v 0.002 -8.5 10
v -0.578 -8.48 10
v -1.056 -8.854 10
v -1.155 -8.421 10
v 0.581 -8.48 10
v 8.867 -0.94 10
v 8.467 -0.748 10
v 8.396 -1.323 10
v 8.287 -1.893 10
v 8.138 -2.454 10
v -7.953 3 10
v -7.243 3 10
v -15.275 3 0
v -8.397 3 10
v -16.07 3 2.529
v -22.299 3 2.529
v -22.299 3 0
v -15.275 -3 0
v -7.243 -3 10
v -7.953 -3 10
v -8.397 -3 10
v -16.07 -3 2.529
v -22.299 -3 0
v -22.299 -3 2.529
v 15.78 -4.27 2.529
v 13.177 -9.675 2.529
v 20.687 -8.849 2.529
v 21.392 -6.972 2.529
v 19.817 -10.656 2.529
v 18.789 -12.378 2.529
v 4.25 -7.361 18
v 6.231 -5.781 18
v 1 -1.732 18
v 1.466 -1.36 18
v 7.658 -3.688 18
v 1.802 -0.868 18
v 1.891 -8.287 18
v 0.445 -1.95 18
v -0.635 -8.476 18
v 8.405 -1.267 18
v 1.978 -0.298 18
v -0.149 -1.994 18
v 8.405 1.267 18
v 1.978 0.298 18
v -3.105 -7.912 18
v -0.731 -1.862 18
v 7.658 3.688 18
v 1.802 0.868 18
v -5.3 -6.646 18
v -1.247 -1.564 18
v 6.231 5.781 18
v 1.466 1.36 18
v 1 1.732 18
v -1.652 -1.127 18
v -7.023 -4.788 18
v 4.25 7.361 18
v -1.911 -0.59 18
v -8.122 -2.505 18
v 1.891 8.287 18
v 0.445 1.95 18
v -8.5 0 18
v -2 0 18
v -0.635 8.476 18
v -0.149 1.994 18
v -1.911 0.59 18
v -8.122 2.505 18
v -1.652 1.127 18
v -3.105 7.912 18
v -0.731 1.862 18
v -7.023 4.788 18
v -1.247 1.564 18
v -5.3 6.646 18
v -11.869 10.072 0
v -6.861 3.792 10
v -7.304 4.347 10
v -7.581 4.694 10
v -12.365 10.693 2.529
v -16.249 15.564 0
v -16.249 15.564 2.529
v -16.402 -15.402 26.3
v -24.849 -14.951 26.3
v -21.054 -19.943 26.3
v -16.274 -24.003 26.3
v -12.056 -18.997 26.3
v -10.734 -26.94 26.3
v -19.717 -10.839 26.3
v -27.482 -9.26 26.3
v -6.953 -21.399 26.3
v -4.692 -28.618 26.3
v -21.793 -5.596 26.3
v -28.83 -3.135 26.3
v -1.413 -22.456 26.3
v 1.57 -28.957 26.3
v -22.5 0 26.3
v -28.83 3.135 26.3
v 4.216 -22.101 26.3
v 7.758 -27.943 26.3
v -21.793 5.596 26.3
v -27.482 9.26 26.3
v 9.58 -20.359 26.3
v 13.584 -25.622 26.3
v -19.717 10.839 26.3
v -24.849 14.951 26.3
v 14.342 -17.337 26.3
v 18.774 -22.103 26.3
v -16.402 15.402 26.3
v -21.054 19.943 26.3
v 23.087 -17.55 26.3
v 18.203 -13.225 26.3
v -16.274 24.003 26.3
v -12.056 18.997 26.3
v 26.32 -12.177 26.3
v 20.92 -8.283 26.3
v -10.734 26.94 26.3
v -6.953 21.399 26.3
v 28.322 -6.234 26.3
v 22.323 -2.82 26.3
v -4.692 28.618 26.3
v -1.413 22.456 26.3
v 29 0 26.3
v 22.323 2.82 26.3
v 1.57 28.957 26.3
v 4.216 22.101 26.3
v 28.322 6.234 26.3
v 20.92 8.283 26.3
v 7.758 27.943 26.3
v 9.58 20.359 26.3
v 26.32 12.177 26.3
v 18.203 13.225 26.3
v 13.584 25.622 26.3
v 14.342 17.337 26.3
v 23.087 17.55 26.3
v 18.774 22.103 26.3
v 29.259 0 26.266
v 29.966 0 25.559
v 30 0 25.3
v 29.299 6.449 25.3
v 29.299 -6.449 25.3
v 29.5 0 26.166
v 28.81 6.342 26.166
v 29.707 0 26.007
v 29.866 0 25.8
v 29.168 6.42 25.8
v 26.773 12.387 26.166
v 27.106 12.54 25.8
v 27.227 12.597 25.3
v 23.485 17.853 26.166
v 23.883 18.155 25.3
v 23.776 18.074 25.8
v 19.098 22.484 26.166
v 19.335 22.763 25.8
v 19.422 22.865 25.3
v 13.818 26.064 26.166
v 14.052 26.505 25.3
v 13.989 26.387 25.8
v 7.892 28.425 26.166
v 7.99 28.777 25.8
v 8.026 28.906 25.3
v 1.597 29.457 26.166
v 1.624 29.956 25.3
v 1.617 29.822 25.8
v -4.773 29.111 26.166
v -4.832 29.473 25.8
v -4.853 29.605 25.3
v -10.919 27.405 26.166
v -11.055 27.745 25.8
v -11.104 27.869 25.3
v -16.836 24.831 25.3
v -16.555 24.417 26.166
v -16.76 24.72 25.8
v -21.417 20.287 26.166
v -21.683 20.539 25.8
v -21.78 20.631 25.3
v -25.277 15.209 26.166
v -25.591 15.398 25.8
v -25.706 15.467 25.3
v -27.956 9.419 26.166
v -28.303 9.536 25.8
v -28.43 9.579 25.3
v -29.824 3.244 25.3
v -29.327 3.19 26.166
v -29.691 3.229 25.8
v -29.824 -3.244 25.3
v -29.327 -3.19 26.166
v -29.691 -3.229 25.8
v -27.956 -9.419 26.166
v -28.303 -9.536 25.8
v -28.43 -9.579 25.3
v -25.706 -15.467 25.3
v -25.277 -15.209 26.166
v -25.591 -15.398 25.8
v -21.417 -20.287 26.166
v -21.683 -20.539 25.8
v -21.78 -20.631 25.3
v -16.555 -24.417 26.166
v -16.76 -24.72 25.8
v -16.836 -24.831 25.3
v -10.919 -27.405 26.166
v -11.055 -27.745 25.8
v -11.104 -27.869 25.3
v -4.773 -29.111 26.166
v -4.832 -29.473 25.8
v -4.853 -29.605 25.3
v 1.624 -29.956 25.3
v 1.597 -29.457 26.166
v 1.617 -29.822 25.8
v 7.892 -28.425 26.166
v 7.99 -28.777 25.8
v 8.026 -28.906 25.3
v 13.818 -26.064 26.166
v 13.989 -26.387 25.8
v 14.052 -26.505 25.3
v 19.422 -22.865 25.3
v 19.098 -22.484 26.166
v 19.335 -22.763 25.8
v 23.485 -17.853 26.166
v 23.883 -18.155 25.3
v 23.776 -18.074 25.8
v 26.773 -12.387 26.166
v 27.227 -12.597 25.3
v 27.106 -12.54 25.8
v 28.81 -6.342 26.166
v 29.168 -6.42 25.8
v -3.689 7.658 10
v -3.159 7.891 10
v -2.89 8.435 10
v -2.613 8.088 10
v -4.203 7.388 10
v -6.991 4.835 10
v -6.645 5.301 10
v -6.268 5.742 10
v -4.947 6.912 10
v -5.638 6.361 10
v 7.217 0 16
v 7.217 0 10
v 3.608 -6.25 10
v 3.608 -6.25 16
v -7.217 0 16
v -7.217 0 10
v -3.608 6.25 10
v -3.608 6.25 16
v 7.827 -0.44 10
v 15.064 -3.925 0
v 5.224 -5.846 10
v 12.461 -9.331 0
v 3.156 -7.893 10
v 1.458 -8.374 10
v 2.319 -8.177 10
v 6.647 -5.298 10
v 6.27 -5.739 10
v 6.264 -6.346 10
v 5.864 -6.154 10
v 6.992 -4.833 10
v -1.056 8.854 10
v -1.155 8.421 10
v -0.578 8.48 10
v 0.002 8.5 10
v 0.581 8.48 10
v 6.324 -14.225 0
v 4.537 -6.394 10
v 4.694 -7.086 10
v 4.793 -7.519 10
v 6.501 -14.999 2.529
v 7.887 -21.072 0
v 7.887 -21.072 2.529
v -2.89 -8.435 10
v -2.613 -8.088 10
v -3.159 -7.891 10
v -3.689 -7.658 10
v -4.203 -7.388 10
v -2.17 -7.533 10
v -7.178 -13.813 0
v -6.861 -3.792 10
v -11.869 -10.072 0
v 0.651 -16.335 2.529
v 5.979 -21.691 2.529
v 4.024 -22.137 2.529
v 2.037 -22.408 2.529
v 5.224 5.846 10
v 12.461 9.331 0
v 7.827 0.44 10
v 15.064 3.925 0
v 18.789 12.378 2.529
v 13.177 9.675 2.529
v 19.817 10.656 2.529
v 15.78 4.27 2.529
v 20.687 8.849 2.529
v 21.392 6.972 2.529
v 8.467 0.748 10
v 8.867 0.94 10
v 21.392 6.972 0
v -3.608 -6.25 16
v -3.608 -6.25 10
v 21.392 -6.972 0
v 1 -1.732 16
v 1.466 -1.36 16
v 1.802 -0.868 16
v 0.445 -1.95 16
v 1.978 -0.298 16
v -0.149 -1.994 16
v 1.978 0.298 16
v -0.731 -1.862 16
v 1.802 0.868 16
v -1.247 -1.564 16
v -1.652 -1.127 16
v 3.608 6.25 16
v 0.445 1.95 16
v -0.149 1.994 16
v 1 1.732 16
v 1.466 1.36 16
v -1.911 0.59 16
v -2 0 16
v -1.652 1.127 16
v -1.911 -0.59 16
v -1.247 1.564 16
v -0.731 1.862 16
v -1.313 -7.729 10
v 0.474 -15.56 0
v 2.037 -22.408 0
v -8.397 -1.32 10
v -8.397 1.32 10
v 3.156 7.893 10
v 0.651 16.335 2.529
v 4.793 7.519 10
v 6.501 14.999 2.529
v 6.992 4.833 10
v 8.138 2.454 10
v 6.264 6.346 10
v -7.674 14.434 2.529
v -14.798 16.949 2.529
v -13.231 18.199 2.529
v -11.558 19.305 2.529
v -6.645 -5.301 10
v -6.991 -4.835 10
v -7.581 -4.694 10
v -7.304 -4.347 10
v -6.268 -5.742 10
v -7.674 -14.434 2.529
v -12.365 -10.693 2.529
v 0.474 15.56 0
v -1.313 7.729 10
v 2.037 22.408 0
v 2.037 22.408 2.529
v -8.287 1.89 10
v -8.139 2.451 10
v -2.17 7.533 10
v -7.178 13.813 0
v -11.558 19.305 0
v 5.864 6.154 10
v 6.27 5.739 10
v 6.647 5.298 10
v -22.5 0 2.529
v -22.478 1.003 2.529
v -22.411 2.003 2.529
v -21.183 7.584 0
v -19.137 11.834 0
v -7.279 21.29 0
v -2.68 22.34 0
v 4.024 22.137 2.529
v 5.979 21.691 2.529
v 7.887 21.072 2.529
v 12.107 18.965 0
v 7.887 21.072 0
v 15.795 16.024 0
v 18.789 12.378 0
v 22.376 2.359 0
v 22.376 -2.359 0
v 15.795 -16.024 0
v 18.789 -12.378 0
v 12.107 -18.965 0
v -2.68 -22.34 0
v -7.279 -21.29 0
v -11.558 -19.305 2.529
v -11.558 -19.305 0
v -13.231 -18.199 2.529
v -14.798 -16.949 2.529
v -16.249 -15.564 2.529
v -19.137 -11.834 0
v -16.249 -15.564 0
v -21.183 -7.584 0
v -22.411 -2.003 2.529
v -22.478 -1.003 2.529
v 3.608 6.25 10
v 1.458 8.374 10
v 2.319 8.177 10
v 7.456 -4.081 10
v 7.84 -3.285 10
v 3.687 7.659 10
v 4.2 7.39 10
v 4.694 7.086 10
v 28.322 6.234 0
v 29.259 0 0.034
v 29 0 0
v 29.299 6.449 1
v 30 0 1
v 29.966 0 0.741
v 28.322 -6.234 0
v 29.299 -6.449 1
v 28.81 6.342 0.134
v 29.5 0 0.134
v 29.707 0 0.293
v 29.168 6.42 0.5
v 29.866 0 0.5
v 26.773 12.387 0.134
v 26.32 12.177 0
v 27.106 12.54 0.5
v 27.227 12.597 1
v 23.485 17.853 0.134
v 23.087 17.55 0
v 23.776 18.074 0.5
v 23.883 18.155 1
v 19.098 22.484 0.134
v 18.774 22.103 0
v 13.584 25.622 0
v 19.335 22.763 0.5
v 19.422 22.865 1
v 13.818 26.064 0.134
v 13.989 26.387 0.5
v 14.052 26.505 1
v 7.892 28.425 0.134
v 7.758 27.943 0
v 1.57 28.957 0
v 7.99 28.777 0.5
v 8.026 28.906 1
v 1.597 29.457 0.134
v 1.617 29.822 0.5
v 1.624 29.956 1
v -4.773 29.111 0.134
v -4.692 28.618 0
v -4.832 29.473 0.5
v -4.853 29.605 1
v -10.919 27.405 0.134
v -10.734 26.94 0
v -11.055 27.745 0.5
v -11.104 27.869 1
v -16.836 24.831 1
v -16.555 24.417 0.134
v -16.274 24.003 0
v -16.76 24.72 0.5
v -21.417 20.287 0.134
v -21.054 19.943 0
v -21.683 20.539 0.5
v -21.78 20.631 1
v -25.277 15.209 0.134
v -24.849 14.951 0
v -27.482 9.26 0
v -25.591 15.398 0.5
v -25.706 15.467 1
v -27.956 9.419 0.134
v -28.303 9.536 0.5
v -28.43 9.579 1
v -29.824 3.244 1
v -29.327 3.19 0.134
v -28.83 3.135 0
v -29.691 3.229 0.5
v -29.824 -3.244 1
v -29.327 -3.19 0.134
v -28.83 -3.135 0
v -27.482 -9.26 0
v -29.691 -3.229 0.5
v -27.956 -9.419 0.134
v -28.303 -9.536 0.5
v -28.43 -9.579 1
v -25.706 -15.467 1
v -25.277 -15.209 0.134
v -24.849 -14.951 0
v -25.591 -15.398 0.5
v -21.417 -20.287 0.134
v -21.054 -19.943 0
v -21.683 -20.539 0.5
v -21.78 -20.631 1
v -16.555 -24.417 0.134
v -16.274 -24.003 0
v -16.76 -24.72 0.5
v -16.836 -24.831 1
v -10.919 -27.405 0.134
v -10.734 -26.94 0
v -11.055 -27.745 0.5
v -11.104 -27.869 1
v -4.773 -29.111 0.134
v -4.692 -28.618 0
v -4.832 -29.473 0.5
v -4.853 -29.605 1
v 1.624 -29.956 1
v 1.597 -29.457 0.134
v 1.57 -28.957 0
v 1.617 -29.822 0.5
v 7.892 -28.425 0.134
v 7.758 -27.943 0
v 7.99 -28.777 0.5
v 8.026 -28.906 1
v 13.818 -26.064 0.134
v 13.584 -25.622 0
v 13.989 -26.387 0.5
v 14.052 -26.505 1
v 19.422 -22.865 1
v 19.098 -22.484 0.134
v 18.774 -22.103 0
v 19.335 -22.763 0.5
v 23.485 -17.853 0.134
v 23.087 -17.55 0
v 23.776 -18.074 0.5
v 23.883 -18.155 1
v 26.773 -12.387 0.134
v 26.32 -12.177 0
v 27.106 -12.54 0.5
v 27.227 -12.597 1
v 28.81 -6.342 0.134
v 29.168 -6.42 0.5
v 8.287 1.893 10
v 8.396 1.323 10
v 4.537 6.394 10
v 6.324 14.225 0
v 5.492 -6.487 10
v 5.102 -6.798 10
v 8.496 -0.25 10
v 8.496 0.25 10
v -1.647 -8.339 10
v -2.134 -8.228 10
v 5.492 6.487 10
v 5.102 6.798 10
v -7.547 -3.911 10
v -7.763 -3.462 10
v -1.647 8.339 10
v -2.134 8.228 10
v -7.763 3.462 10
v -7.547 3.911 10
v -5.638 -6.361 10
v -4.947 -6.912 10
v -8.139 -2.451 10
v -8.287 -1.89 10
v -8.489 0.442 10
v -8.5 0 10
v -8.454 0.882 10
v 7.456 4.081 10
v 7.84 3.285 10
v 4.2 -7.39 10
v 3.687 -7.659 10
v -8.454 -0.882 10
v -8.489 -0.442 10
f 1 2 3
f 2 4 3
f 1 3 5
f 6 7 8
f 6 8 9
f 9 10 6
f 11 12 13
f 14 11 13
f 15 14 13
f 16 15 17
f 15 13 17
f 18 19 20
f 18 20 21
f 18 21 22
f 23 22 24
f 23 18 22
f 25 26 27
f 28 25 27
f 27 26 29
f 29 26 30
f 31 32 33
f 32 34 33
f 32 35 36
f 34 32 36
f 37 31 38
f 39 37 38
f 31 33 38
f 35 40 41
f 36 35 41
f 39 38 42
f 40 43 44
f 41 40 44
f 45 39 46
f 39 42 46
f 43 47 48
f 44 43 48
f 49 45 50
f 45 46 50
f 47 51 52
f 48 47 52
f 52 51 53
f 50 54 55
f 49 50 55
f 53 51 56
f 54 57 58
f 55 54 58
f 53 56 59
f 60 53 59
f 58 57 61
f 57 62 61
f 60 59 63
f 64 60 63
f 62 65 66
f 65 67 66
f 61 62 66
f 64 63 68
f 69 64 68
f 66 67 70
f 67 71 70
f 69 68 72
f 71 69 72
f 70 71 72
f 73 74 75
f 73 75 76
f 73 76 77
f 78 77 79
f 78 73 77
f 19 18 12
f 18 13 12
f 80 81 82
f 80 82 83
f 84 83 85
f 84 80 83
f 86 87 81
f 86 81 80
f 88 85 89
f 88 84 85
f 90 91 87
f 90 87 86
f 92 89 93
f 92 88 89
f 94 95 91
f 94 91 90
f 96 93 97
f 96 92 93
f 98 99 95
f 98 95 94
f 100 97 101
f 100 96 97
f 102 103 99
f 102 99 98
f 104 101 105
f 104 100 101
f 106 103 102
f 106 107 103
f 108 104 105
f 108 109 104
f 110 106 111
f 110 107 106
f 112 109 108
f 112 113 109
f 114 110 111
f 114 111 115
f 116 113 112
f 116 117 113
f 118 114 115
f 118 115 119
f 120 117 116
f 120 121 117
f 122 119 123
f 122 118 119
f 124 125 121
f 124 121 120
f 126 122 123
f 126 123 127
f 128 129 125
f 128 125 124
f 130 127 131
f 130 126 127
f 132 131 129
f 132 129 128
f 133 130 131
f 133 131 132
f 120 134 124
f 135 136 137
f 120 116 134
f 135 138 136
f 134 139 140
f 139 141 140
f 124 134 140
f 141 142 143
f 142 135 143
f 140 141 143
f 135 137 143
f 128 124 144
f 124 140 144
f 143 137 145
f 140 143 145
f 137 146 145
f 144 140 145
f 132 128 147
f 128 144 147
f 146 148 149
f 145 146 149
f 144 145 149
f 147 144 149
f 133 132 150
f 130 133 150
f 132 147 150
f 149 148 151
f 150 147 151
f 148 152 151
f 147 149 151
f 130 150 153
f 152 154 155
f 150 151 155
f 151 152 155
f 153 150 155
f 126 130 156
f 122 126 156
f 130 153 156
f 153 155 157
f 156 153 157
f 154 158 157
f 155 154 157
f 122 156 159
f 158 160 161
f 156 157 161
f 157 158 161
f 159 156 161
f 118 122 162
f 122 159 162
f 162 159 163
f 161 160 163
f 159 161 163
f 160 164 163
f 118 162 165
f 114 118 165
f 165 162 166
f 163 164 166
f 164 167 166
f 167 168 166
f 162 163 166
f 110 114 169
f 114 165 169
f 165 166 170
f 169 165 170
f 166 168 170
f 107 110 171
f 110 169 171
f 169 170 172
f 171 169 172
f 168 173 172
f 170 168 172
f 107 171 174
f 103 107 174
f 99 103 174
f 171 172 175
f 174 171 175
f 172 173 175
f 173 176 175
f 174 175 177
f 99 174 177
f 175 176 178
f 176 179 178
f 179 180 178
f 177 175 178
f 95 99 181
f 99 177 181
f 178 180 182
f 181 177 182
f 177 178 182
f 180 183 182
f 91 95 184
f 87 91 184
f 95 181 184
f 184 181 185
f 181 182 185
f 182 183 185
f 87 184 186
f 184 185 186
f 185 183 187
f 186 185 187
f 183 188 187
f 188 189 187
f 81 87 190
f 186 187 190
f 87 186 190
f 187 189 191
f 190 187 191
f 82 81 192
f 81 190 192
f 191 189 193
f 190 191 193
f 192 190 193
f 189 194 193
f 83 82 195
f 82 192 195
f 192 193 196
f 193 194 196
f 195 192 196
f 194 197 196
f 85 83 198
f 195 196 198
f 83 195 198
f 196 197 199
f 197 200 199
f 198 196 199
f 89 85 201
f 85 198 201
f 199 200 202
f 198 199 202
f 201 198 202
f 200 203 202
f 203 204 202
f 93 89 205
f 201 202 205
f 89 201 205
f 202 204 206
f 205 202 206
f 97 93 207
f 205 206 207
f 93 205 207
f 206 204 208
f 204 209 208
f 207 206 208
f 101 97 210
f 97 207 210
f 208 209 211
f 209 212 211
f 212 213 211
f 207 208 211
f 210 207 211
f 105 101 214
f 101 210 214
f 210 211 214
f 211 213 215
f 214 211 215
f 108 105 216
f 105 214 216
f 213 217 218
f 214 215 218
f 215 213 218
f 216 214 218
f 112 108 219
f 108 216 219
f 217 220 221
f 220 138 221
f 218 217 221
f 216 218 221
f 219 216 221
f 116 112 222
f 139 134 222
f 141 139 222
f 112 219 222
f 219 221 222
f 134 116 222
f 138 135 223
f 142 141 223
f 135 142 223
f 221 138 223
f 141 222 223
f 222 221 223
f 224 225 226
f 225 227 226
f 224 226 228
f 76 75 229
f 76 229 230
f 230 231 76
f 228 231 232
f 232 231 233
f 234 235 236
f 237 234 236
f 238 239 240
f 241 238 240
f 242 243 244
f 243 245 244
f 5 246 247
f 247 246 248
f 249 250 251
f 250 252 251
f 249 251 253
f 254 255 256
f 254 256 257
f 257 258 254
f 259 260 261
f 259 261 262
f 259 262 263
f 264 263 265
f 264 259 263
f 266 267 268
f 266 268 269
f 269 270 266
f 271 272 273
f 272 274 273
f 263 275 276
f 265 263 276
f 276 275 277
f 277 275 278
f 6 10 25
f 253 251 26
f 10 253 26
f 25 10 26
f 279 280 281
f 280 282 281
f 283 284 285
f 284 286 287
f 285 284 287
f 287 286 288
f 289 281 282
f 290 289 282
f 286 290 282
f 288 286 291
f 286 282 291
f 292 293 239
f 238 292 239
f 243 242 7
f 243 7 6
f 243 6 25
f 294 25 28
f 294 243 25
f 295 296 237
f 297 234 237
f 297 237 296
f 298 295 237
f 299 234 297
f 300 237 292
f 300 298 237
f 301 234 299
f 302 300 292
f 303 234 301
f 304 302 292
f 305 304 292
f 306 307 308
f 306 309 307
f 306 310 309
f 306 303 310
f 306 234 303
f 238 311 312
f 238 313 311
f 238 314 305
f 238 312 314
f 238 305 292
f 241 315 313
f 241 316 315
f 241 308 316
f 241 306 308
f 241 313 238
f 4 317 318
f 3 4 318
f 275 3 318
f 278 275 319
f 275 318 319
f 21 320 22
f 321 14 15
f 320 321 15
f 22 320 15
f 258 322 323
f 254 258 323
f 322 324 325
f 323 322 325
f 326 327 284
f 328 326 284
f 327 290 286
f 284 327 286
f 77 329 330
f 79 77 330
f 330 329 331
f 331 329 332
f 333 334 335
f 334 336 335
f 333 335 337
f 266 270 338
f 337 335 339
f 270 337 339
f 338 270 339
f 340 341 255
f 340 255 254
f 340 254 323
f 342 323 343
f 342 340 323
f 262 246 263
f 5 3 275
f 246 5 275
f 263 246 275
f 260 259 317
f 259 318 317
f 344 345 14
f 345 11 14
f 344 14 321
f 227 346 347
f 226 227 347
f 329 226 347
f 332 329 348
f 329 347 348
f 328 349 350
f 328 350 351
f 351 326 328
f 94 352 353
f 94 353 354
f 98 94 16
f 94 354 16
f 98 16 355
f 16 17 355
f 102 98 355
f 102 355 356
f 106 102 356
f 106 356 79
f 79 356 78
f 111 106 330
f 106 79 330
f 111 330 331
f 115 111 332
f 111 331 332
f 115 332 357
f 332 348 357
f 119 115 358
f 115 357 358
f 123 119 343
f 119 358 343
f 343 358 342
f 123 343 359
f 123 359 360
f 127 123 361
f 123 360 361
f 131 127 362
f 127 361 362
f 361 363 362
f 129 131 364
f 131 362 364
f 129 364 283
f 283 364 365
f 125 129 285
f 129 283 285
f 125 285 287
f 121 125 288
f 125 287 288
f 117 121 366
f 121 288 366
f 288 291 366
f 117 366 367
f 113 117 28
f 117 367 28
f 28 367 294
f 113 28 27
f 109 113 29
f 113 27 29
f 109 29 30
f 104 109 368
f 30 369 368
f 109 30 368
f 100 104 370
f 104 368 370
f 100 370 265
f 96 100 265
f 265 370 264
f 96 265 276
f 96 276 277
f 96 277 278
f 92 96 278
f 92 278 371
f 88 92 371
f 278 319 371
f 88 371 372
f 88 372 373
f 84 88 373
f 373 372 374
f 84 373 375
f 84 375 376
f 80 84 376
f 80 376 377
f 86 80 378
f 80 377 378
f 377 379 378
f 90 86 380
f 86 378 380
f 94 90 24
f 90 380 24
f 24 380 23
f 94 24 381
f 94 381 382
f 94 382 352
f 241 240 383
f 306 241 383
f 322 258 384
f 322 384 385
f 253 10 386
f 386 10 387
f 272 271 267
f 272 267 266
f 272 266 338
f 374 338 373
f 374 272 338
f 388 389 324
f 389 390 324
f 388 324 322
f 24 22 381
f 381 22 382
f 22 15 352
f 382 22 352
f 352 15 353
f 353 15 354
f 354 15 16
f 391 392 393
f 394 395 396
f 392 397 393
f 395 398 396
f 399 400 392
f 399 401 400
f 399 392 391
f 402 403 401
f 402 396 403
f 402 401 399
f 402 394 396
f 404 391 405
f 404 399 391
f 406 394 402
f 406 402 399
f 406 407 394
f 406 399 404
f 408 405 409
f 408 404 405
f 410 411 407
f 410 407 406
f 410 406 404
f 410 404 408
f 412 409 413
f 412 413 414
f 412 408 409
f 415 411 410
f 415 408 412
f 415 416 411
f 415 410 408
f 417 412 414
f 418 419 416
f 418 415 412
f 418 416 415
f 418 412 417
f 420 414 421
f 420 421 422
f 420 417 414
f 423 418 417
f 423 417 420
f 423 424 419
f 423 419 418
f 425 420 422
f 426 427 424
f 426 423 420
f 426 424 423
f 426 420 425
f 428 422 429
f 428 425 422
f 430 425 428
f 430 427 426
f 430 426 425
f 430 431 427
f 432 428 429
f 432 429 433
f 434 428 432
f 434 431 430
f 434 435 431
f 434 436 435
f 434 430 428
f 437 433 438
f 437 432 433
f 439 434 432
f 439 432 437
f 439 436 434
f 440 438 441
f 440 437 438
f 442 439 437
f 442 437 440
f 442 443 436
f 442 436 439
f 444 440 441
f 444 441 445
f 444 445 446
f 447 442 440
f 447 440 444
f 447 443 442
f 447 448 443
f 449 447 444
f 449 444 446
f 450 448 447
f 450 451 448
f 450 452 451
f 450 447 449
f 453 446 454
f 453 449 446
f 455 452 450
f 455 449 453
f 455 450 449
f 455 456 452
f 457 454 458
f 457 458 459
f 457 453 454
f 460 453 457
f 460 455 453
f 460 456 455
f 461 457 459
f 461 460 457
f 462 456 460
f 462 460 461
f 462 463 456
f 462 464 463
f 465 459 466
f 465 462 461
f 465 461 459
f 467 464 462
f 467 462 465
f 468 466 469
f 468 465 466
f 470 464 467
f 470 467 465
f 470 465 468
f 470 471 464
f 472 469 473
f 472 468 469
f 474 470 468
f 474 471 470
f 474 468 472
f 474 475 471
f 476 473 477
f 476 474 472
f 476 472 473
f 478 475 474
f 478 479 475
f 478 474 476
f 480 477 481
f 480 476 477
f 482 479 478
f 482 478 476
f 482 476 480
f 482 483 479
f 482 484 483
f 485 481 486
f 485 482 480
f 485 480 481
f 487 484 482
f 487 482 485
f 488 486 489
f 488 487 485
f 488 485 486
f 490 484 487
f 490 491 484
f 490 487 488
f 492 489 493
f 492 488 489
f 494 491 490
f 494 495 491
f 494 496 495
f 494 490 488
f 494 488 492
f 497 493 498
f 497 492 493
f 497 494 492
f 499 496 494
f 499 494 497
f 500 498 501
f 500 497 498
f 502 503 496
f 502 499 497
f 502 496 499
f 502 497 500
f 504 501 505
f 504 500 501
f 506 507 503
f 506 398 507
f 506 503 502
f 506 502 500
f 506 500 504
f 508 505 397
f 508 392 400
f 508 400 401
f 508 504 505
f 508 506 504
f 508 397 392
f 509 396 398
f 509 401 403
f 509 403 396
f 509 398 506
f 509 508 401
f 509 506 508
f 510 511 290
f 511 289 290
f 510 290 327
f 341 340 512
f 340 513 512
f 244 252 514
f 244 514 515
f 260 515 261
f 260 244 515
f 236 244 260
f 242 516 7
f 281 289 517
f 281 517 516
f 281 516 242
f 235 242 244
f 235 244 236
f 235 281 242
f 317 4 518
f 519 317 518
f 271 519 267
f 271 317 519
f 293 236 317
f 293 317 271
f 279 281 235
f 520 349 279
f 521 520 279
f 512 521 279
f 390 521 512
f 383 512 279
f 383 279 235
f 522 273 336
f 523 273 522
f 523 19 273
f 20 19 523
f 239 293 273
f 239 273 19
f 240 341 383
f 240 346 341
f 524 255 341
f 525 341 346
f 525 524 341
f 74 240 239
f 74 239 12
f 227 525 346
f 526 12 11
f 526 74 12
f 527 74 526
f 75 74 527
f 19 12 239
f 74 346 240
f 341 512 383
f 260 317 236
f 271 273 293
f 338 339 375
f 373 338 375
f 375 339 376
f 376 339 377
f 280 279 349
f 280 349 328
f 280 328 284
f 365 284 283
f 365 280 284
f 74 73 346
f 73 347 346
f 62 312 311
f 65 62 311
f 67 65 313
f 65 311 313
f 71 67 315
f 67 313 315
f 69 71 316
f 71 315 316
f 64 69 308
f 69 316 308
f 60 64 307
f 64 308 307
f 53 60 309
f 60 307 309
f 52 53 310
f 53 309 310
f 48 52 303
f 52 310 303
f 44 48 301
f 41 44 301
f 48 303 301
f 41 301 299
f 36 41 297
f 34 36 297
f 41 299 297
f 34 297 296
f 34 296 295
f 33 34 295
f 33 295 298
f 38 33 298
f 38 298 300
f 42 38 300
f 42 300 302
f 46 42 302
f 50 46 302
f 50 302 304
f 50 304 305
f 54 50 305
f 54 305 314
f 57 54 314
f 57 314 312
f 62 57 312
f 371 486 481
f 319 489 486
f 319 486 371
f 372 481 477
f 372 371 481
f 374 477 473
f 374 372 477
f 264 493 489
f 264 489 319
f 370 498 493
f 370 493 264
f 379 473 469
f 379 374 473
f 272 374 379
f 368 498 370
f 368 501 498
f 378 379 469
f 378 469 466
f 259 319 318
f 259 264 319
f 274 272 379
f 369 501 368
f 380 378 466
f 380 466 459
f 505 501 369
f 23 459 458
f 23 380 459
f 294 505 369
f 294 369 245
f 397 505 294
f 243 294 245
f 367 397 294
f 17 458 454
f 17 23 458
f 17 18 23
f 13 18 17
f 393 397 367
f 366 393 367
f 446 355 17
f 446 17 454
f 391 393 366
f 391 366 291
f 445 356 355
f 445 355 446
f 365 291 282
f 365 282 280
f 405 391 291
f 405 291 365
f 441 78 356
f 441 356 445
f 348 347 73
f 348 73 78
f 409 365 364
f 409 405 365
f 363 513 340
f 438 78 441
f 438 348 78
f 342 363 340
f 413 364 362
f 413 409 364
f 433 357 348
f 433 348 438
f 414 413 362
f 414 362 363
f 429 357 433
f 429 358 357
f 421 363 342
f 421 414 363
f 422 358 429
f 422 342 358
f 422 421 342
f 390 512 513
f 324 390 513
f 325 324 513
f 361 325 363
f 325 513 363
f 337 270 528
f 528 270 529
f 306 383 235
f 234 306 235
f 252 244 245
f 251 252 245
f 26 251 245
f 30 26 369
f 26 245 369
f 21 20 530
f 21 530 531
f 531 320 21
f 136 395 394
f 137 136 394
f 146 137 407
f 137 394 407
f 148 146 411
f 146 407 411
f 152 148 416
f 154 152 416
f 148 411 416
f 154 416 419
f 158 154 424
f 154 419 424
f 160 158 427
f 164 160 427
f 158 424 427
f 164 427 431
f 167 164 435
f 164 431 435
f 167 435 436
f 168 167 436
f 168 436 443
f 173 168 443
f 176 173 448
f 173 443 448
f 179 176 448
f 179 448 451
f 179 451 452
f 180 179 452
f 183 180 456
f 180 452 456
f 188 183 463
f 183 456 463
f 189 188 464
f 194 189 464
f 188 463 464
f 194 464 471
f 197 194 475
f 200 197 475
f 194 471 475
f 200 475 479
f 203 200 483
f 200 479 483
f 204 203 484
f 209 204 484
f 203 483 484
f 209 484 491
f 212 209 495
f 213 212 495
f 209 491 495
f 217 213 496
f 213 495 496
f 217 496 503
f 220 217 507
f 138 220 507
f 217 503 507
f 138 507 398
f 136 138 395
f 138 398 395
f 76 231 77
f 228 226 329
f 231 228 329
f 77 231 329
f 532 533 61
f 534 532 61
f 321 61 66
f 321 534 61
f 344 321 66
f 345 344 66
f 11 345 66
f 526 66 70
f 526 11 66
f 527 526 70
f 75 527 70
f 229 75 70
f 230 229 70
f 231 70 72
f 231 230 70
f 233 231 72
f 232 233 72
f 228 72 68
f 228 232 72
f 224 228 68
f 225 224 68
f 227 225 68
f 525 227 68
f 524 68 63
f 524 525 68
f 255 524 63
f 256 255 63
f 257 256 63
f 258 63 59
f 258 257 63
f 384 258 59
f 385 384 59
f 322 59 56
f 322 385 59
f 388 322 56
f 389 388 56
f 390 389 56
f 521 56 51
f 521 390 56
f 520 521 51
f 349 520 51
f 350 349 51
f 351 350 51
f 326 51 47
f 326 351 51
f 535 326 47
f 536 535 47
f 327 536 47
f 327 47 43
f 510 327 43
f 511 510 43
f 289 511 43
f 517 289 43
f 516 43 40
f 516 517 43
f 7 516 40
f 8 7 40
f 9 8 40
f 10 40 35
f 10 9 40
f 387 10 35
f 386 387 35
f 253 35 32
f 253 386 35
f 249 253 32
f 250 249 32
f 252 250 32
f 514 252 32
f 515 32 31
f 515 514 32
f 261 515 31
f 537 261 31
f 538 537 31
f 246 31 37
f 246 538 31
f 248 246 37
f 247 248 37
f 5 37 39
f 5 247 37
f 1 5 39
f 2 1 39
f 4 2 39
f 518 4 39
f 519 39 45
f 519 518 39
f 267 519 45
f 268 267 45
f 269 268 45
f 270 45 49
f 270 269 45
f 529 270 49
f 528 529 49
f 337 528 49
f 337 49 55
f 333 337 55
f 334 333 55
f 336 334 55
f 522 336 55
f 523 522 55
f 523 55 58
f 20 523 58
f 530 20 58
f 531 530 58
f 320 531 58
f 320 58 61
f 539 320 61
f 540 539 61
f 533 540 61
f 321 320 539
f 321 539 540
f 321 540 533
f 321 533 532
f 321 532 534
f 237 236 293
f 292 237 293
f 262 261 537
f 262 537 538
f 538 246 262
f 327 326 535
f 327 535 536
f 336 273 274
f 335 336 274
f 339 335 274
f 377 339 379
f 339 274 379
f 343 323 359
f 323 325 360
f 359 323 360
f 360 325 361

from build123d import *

# Parameters (mm, degrees)
SKETCH_1_R               = 30
EXTRUDE_1_DEPTH          = 26.3
SKETCH_2_R               = 22.5
CUT_EXTRUDE_1_DEPTH      = 27.3
SKETCH_3_R               = 8.5
SKETCH_3_R_2             = 2
EXTRUDE_2_DEPTH          = 8
CUT_EXTRUDE_2_DEPTH      = 6
EXTRUDE_3_DEPTH          = 3
PATTERN_CIRCULAR_1_COUNT = 7
FILLET_1_R               = 1


with BuildPart() as part:
    # 草图1 → 凸台-拉伸1 (new body)
    with BuildSketch(Plane.XY):
        Circle(SKETCH_1_R)
    extrude(amount=EXTRUDE_1_DEPTH)

    # 草图2 → 切除-拉伸1 (cut, through all)
    with BuildSketch(Plane(origin=(0, 0, 0), x_dir=(-1, 0, 0), z_dir=(0, 0, -1))):
        Circle(SKETCH_2_R)
    extrude(amount=-CUT_EXTRUDE_1_DEPTH, mode=Mode.SUBTRACT)



with BuildPart() as body_2:
    # 草图3 → 凸台-拉伸2 (new body)
    with BuildSketch(Plane(origin=(0, 0, 10), x_dir=(-1, 0, 0), z_dir=(0, 0, -1))):
        Circle(SKETCH_3_R)
        Circle(SKETCH_3_R_2, mode=Mode.SUBTRACT)
    extrude(amount=-EXTRUDE_2_DEPTH)

    # 草图4 → 切除-拉伸2 (cut)
    with BuildSketch(Plane(origin=(0, 0, 10), x_dir=(-1, 0, 0), z_dir=(0, 0, -1))):
        Polygon((7.216878365, 0), (3.608439182, 6.25), (-3.608439182, 6.25), (-7.216878365, 0), (-3.608439182, -6.25), (3.608439182, -6.25), align=None)
    extrude(amount=-CUT_EXTRUDE_2_DEPTH, mode=Mode.SUBTRACT)


with BuildPart() as part_1:
    add(part.part)

    add(body_2.part)  # 凸台-拉伸3 merges body 2
    # 草图5 → 凸台-拉伸3 (add, symmetric)
    with BuildSketch(Plane(origin=(0, 0, 0), x_dir=(1, 0, 0), z_dir=(0, 1, 0))):
        Polygon((-22.5, 0), (-15.275057212, 0), (-7.243077648, -10), (-8.396842229, -10), (-16.069885632, -2.529070305), (-24.164958171, -2.529070305), (-24.164958171, 0), align=None)
    extrude_3 = extrude(amount=EXTRUDE_3_DEPTH, both=True)

    # 阵列(圆周)1: 凸台-拉伸3 ×7 about axis
    pattern_circular_1_axis = Axis((0, 0, 0), (0, 0, 1))
    for i in range(1, PATTERN_CIRCULAR_1_COUNT):
        add(extrude_3.rotate(pattern_circular_1_axis, i * 360 / PATTERN_CIRCULAR_1_COUNT))

    # 圆角1
    fillet_1_edges = [part_1.edges().sort_by_distance(p)[0] for p in [
        (-30, 0, 0),
        (-30, 0, 26.3),
    ]]
    fillet(fillet_1_edges, radius=FILLET_1_R)


solid = part_1.part
